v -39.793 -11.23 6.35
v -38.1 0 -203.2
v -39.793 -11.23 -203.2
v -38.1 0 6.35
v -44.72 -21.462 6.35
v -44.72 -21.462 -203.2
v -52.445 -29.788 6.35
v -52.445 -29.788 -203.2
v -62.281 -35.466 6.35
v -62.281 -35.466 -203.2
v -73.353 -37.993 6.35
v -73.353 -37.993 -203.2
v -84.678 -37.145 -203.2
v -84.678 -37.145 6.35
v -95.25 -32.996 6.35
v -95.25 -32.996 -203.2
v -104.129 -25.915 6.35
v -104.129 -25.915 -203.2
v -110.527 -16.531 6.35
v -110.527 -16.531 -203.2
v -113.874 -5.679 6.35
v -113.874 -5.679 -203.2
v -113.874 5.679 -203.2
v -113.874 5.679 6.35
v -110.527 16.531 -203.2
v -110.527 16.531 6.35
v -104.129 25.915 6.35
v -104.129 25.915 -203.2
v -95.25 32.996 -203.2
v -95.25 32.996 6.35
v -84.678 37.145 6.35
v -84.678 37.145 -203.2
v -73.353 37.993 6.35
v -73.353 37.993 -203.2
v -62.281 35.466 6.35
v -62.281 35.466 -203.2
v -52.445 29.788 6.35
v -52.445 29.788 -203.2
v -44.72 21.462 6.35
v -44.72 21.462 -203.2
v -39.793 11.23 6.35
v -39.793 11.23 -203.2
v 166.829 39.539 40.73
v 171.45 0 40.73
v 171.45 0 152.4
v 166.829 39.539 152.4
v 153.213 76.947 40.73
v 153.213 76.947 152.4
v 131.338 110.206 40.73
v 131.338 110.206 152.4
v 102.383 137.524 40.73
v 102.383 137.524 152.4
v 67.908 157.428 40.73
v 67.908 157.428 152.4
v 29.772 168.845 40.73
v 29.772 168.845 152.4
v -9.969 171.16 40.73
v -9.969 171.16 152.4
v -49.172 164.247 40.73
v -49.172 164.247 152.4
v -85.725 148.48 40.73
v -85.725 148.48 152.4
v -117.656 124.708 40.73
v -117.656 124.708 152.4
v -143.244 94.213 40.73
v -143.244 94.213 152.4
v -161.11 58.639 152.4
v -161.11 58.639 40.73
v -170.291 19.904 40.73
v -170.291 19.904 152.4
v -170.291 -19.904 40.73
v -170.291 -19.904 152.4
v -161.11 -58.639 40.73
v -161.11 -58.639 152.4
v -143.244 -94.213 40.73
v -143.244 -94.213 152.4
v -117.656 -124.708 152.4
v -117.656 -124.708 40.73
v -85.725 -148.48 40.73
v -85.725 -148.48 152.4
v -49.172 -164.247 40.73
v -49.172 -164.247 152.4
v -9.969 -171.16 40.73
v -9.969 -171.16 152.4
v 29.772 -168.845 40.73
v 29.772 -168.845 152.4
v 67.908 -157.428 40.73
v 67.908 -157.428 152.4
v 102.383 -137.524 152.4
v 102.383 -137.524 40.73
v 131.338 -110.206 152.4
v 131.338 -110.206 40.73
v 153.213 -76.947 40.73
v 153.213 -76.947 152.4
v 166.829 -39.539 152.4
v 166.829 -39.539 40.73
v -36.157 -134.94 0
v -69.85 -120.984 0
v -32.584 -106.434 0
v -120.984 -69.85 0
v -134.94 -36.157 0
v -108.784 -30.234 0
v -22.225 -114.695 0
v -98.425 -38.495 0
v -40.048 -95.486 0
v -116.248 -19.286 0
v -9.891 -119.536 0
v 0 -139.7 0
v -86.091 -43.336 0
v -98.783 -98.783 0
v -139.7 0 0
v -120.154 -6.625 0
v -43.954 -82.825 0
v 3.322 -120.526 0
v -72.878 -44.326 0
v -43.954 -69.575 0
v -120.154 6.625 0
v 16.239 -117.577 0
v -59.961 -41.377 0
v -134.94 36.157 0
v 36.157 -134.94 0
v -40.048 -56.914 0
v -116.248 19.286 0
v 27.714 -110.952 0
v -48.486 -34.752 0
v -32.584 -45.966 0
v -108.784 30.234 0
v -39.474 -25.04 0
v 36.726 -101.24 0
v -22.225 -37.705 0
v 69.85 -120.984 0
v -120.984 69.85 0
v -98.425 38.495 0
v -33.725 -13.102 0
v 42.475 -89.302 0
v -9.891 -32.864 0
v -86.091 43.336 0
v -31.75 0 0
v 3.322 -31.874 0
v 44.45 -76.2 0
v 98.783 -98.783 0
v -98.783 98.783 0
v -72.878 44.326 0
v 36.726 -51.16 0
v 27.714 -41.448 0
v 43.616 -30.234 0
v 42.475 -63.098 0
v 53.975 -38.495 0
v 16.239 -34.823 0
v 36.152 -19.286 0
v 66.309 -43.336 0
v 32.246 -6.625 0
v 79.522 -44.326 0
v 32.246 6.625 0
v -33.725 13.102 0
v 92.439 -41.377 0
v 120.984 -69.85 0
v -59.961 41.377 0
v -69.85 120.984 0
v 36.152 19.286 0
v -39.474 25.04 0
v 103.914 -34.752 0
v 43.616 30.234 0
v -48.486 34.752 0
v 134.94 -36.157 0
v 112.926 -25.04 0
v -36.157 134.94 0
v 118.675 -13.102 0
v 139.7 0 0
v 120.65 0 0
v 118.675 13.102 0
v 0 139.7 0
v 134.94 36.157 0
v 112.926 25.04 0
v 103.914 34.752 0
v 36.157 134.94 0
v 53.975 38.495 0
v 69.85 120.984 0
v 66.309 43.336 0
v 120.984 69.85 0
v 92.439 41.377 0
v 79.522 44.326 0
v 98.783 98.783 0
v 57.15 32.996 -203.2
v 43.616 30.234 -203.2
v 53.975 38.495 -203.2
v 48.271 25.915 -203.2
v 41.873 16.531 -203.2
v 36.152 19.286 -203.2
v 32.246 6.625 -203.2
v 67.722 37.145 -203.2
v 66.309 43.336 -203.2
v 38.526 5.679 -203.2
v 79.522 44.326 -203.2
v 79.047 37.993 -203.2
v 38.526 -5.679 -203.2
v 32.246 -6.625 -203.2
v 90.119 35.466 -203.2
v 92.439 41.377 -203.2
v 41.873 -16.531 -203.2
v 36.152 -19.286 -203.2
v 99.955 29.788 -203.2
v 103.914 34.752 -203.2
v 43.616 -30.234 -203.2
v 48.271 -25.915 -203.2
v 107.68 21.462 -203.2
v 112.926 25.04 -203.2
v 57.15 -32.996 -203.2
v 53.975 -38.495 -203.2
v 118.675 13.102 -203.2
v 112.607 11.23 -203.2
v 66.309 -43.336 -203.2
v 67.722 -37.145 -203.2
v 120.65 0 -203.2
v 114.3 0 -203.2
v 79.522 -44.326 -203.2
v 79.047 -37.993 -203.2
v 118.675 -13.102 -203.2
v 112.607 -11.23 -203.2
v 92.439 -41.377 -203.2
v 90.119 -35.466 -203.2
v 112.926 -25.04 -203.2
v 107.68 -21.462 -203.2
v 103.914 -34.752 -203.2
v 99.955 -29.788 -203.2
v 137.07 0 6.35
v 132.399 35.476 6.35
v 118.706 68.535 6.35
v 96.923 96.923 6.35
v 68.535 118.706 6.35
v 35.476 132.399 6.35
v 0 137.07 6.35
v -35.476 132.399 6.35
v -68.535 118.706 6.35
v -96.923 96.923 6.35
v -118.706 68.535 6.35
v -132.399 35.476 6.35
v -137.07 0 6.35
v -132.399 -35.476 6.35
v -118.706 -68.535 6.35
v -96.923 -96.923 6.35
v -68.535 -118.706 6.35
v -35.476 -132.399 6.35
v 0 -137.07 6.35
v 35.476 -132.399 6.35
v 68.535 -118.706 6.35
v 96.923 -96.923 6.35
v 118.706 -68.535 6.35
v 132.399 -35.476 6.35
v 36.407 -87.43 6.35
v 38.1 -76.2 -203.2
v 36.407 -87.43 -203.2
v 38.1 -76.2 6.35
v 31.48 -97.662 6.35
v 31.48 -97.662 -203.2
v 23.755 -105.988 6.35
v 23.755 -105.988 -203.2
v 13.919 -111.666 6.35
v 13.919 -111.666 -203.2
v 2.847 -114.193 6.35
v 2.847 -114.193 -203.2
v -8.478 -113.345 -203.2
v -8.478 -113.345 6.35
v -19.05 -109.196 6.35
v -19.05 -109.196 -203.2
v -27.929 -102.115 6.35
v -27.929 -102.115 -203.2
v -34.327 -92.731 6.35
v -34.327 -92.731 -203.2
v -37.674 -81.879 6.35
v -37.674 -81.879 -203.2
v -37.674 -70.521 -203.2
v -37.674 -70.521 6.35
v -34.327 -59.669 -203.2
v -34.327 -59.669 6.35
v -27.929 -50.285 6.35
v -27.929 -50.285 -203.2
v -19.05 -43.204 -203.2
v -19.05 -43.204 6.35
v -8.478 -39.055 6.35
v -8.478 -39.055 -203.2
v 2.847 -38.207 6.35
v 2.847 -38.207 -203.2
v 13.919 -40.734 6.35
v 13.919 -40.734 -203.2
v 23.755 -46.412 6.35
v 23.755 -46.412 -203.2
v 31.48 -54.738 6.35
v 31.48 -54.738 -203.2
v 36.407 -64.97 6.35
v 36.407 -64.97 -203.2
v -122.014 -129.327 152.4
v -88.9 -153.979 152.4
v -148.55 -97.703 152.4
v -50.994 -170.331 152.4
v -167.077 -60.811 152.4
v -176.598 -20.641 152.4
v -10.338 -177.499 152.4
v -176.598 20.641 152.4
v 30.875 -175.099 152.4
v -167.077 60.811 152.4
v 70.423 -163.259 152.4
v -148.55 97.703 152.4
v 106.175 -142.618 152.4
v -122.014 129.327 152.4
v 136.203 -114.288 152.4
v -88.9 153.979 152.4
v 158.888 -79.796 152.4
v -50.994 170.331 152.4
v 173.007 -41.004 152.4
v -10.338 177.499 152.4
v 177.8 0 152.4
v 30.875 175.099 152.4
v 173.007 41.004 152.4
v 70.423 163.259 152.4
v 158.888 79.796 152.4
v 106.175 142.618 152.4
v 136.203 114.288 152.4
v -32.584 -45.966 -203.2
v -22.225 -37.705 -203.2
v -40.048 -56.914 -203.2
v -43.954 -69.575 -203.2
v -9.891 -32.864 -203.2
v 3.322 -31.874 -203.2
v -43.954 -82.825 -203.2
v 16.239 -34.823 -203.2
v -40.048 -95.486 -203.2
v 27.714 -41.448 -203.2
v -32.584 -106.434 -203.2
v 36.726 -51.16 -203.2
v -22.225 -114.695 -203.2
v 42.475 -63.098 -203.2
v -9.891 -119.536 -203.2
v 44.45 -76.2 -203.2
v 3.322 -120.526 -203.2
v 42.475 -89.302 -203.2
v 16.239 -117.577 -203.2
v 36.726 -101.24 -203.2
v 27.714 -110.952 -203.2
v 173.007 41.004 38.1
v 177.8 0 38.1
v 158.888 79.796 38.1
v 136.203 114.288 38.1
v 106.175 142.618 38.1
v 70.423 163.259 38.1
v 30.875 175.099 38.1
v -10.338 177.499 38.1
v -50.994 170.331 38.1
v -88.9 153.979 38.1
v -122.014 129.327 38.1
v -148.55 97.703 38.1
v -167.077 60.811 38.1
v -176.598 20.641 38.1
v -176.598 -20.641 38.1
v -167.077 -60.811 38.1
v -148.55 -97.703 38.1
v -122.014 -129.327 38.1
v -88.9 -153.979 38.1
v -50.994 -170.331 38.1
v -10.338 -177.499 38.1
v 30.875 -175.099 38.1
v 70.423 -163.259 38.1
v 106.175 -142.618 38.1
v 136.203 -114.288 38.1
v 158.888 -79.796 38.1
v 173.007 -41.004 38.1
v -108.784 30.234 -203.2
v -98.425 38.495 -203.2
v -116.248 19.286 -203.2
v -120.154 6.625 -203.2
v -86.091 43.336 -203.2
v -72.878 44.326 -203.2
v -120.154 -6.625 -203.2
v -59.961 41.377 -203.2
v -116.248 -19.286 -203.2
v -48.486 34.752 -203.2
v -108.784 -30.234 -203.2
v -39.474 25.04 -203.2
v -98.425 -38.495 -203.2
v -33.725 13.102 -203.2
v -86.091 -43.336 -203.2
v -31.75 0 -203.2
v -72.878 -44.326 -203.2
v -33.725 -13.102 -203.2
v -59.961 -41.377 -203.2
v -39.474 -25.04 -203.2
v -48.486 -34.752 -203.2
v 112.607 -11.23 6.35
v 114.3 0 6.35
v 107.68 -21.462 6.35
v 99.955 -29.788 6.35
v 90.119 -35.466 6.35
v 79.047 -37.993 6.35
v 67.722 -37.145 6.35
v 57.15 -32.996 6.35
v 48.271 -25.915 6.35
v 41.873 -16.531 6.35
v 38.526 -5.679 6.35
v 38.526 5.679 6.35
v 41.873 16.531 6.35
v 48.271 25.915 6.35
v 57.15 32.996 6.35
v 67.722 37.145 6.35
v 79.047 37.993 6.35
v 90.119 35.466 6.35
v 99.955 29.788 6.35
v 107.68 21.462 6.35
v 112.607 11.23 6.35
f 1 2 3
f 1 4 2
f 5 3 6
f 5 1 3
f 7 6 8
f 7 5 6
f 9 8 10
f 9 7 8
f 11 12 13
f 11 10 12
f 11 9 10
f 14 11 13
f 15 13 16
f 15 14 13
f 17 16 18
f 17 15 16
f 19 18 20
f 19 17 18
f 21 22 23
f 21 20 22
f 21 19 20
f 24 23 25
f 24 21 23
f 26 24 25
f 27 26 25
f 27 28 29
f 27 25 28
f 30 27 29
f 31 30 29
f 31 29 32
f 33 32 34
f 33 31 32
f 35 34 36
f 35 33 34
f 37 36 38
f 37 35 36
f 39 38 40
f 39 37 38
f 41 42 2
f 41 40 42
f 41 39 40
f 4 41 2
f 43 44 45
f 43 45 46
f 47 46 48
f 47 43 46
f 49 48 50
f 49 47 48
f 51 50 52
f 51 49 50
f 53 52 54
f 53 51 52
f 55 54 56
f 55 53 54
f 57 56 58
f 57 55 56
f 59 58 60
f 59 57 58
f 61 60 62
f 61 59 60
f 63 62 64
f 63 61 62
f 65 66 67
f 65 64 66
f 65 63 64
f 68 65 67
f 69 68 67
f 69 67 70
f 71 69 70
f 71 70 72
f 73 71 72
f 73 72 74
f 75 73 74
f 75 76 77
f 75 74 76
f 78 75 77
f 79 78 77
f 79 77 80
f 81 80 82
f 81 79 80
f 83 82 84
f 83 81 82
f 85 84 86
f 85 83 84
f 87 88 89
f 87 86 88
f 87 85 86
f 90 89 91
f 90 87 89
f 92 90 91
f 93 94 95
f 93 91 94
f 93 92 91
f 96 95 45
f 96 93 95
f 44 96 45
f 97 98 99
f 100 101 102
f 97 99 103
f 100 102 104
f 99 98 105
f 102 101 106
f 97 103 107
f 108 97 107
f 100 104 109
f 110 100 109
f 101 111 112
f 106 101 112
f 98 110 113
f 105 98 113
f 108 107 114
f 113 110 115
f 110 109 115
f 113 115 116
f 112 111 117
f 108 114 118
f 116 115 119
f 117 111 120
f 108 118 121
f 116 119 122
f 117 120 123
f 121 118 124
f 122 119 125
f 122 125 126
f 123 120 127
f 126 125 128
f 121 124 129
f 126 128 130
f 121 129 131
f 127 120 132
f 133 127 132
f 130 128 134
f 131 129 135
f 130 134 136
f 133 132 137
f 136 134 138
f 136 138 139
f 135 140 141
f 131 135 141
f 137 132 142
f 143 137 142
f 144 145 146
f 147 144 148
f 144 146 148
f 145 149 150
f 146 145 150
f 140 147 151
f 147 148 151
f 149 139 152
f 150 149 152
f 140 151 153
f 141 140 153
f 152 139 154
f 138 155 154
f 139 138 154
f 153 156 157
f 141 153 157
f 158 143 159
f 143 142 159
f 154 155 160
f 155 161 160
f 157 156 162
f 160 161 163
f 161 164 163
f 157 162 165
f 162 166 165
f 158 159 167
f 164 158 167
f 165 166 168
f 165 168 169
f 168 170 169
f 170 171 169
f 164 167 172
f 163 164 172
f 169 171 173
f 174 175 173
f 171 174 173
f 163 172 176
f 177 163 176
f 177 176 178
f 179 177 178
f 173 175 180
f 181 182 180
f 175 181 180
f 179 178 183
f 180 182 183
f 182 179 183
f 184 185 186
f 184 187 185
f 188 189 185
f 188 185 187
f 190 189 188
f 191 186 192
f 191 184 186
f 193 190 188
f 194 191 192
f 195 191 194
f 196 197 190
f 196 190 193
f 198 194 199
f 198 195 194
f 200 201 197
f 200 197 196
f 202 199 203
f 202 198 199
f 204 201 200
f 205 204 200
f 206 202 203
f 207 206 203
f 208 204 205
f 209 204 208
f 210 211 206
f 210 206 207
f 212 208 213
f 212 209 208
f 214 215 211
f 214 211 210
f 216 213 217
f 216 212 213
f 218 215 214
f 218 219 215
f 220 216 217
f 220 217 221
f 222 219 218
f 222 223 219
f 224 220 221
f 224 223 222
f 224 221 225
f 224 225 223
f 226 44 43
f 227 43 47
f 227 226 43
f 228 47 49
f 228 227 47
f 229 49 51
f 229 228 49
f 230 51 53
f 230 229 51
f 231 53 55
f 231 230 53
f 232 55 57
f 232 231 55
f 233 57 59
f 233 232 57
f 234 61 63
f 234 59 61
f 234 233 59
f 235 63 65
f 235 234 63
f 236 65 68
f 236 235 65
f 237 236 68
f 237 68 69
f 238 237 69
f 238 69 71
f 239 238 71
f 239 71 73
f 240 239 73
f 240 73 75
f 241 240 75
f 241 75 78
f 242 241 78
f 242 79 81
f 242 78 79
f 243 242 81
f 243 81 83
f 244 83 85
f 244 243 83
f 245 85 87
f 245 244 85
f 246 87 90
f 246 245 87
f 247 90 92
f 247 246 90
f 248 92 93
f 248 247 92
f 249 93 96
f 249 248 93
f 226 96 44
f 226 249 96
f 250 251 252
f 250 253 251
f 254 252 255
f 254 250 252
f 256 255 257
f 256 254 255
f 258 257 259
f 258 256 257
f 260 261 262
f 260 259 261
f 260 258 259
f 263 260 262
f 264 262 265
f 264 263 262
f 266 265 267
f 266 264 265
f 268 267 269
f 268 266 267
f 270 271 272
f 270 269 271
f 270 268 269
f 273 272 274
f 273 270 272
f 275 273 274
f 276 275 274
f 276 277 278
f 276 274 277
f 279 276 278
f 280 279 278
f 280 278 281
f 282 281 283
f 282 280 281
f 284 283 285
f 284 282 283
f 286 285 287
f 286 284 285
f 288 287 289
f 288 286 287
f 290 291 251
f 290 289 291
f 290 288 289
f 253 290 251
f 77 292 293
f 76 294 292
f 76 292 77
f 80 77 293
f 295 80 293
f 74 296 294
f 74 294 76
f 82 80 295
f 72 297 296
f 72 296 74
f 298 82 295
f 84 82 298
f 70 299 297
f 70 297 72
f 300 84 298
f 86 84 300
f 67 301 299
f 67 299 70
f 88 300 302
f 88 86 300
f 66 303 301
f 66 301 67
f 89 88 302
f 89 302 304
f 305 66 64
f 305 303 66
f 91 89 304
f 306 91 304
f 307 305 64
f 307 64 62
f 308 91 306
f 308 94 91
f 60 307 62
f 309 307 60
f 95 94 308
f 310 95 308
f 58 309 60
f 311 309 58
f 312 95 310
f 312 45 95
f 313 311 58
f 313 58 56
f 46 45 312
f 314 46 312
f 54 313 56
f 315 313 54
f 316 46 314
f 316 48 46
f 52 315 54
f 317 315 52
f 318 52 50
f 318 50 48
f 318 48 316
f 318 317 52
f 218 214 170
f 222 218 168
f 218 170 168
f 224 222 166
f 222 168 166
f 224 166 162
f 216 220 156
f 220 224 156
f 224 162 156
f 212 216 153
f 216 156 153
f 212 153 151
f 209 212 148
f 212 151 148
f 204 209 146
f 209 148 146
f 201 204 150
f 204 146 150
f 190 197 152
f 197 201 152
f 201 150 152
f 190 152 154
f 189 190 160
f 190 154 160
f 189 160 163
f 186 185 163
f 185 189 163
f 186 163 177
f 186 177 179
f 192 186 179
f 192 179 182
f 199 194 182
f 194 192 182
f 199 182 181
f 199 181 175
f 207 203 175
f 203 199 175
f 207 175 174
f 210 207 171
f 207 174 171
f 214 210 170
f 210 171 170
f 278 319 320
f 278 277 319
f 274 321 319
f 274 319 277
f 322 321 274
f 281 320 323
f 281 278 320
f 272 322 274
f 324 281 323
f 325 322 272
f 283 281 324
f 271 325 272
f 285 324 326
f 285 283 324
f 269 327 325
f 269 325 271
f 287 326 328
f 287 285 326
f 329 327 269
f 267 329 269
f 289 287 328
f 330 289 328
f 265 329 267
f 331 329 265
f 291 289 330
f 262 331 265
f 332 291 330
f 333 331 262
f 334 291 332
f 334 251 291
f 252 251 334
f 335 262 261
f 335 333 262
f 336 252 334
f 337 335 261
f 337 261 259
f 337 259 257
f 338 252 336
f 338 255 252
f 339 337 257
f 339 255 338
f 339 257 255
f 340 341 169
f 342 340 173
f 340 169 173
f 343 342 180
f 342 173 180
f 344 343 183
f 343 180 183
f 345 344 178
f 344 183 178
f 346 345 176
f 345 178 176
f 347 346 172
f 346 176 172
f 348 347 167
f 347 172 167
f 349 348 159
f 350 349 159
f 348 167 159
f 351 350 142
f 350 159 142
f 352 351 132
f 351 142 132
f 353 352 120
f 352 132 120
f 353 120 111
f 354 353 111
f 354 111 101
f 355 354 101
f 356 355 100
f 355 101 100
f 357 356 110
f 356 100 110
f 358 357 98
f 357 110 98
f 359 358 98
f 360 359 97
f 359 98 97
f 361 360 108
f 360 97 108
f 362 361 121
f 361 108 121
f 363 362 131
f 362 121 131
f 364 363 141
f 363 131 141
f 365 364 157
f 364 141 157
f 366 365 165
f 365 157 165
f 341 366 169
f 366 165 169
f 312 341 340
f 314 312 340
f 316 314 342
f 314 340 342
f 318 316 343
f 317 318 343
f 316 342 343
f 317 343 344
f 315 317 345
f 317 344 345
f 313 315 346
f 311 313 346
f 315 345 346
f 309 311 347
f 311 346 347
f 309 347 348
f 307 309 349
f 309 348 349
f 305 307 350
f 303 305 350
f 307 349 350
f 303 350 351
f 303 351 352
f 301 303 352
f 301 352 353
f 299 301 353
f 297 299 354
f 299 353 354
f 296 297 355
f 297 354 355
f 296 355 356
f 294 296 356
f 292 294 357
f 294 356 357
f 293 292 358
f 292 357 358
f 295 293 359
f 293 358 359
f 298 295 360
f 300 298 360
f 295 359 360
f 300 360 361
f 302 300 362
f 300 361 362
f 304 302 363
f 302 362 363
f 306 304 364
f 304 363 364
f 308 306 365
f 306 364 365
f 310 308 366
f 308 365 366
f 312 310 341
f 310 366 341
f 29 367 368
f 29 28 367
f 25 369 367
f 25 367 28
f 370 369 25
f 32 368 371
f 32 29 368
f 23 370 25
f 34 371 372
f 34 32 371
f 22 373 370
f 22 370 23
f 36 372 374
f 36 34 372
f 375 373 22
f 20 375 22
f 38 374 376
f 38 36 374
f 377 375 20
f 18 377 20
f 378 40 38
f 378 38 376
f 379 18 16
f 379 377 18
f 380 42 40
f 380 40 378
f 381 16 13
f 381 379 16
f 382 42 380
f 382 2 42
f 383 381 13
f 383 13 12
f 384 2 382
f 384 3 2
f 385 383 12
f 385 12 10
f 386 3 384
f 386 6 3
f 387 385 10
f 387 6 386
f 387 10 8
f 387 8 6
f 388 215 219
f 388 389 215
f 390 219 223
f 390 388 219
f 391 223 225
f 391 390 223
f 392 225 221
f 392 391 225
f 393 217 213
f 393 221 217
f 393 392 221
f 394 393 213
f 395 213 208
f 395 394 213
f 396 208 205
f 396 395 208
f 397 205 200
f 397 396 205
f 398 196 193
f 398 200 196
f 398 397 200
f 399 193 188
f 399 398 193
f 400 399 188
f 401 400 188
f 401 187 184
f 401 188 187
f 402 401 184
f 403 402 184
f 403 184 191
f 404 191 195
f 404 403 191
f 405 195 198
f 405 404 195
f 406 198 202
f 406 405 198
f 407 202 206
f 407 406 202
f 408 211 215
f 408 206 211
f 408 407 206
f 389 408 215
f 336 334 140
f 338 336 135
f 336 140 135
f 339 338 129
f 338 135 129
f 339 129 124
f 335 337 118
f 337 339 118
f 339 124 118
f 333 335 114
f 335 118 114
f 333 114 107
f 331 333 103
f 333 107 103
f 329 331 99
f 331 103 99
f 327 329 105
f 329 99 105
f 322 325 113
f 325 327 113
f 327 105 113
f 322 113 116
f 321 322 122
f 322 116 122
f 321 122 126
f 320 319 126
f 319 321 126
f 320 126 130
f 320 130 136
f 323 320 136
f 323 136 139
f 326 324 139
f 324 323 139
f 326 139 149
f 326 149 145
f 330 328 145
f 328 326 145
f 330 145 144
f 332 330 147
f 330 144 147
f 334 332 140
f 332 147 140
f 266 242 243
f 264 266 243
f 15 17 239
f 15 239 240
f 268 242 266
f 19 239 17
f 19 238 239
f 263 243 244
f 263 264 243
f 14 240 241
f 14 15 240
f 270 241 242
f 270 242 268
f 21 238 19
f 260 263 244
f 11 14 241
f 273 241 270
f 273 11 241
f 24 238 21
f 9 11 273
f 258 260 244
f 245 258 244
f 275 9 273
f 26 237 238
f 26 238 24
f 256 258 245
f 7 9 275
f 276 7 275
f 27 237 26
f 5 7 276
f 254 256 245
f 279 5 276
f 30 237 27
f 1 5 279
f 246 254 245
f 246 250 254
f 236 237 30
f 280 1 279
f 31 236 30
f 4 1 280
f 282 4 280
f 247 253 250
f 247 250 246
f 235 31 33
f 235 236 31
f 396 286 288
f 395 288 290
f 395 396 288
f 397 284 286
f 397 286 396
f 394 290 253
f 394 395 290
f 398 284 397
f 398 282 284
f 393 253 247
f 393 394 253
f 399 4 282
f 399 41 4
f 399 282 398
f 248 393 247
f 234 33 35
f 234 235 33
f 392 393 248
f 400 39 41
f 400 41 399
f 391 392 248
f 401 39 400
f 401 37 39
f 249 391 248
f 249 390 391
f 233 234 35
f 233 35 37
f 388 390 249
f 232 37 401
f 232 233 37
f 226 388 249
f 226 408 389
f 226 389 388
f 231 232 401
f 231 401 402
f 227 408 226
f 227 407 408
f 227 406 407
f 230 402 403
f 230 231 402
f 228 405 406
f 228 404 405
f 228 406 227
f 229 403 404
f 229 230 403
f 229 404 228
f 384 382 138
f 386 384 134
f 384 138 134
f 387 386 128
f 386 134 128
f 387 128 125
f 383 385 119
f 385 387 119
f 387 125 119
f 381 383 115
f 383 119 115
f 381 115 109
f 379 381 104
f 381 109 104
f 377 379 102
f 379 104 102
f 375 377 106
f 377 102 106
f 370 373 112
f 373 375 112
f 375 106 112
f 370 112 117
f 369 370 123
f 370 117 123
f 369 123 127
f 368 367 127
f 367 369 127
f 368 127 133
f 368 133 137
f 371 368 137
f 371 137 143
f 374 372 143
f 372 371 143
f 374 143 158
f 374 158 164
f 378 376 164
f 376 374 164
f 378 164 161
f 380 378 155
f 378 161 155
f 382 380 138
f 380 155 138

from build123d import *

# Parameters (mm, degrees)
F0_R     = 177.8
F1_DEPTH = 152.4
F2_R     = 44.45
F3_DEPTH = 209.55
F4_SIZE  = 38.1
F5_T     = -6.35
F6_R     = 132.6910727627
F7_DEPTH = 6.35


with BuildPart() as f1:
    # F0 (on Top) → F1 (new body)
    with BuildSketch(Plane.XY):
        Circle(F0_R)
    extrude(amount=F1_DEPTH)

    # F2 (on face) → F3 (join)
    with BuildSketch(Plane(origin=(0, 0, 0), x_dir=(1, 0, 0), z_dir=(0, 0, -1))):
        with Locations((76.2, 0)):
            Circle(F2_R)
        with Locations((0, 76.2)):
            Circle(F2_R)
        with Locations((-76.2, 0)):
            Circle(F2_R)
    extrude(amount=F3_DEPTH)

    # F4
    f4_edges = [f1.edges().sort_by_distance(p)[0] for p in [
        (-177.8, 0, 0),
    ]]
    chamfer(f4_edges, length=F4_SIZE)

    # F5
    f5_openings = [f1.faces().sort_by_distance(p)[0] for p in [
        (0, 0, 152.4),
    ]]
    offset(amount=F5_T, openings=f5_openings, kind=Kind.INTERSECTION)

    # F6 (on face) → F7 (cut)
    with BuildSketch(Plane(origin=(0, 0, -209.55), x_dir=(1, 0, 0), z_dir=(0, 0, -1))):
        Circle(F6_R)
    extrude(amount=-F7_DEPTH, mode=Mode.SUBTRACT)


solid = f1.part
